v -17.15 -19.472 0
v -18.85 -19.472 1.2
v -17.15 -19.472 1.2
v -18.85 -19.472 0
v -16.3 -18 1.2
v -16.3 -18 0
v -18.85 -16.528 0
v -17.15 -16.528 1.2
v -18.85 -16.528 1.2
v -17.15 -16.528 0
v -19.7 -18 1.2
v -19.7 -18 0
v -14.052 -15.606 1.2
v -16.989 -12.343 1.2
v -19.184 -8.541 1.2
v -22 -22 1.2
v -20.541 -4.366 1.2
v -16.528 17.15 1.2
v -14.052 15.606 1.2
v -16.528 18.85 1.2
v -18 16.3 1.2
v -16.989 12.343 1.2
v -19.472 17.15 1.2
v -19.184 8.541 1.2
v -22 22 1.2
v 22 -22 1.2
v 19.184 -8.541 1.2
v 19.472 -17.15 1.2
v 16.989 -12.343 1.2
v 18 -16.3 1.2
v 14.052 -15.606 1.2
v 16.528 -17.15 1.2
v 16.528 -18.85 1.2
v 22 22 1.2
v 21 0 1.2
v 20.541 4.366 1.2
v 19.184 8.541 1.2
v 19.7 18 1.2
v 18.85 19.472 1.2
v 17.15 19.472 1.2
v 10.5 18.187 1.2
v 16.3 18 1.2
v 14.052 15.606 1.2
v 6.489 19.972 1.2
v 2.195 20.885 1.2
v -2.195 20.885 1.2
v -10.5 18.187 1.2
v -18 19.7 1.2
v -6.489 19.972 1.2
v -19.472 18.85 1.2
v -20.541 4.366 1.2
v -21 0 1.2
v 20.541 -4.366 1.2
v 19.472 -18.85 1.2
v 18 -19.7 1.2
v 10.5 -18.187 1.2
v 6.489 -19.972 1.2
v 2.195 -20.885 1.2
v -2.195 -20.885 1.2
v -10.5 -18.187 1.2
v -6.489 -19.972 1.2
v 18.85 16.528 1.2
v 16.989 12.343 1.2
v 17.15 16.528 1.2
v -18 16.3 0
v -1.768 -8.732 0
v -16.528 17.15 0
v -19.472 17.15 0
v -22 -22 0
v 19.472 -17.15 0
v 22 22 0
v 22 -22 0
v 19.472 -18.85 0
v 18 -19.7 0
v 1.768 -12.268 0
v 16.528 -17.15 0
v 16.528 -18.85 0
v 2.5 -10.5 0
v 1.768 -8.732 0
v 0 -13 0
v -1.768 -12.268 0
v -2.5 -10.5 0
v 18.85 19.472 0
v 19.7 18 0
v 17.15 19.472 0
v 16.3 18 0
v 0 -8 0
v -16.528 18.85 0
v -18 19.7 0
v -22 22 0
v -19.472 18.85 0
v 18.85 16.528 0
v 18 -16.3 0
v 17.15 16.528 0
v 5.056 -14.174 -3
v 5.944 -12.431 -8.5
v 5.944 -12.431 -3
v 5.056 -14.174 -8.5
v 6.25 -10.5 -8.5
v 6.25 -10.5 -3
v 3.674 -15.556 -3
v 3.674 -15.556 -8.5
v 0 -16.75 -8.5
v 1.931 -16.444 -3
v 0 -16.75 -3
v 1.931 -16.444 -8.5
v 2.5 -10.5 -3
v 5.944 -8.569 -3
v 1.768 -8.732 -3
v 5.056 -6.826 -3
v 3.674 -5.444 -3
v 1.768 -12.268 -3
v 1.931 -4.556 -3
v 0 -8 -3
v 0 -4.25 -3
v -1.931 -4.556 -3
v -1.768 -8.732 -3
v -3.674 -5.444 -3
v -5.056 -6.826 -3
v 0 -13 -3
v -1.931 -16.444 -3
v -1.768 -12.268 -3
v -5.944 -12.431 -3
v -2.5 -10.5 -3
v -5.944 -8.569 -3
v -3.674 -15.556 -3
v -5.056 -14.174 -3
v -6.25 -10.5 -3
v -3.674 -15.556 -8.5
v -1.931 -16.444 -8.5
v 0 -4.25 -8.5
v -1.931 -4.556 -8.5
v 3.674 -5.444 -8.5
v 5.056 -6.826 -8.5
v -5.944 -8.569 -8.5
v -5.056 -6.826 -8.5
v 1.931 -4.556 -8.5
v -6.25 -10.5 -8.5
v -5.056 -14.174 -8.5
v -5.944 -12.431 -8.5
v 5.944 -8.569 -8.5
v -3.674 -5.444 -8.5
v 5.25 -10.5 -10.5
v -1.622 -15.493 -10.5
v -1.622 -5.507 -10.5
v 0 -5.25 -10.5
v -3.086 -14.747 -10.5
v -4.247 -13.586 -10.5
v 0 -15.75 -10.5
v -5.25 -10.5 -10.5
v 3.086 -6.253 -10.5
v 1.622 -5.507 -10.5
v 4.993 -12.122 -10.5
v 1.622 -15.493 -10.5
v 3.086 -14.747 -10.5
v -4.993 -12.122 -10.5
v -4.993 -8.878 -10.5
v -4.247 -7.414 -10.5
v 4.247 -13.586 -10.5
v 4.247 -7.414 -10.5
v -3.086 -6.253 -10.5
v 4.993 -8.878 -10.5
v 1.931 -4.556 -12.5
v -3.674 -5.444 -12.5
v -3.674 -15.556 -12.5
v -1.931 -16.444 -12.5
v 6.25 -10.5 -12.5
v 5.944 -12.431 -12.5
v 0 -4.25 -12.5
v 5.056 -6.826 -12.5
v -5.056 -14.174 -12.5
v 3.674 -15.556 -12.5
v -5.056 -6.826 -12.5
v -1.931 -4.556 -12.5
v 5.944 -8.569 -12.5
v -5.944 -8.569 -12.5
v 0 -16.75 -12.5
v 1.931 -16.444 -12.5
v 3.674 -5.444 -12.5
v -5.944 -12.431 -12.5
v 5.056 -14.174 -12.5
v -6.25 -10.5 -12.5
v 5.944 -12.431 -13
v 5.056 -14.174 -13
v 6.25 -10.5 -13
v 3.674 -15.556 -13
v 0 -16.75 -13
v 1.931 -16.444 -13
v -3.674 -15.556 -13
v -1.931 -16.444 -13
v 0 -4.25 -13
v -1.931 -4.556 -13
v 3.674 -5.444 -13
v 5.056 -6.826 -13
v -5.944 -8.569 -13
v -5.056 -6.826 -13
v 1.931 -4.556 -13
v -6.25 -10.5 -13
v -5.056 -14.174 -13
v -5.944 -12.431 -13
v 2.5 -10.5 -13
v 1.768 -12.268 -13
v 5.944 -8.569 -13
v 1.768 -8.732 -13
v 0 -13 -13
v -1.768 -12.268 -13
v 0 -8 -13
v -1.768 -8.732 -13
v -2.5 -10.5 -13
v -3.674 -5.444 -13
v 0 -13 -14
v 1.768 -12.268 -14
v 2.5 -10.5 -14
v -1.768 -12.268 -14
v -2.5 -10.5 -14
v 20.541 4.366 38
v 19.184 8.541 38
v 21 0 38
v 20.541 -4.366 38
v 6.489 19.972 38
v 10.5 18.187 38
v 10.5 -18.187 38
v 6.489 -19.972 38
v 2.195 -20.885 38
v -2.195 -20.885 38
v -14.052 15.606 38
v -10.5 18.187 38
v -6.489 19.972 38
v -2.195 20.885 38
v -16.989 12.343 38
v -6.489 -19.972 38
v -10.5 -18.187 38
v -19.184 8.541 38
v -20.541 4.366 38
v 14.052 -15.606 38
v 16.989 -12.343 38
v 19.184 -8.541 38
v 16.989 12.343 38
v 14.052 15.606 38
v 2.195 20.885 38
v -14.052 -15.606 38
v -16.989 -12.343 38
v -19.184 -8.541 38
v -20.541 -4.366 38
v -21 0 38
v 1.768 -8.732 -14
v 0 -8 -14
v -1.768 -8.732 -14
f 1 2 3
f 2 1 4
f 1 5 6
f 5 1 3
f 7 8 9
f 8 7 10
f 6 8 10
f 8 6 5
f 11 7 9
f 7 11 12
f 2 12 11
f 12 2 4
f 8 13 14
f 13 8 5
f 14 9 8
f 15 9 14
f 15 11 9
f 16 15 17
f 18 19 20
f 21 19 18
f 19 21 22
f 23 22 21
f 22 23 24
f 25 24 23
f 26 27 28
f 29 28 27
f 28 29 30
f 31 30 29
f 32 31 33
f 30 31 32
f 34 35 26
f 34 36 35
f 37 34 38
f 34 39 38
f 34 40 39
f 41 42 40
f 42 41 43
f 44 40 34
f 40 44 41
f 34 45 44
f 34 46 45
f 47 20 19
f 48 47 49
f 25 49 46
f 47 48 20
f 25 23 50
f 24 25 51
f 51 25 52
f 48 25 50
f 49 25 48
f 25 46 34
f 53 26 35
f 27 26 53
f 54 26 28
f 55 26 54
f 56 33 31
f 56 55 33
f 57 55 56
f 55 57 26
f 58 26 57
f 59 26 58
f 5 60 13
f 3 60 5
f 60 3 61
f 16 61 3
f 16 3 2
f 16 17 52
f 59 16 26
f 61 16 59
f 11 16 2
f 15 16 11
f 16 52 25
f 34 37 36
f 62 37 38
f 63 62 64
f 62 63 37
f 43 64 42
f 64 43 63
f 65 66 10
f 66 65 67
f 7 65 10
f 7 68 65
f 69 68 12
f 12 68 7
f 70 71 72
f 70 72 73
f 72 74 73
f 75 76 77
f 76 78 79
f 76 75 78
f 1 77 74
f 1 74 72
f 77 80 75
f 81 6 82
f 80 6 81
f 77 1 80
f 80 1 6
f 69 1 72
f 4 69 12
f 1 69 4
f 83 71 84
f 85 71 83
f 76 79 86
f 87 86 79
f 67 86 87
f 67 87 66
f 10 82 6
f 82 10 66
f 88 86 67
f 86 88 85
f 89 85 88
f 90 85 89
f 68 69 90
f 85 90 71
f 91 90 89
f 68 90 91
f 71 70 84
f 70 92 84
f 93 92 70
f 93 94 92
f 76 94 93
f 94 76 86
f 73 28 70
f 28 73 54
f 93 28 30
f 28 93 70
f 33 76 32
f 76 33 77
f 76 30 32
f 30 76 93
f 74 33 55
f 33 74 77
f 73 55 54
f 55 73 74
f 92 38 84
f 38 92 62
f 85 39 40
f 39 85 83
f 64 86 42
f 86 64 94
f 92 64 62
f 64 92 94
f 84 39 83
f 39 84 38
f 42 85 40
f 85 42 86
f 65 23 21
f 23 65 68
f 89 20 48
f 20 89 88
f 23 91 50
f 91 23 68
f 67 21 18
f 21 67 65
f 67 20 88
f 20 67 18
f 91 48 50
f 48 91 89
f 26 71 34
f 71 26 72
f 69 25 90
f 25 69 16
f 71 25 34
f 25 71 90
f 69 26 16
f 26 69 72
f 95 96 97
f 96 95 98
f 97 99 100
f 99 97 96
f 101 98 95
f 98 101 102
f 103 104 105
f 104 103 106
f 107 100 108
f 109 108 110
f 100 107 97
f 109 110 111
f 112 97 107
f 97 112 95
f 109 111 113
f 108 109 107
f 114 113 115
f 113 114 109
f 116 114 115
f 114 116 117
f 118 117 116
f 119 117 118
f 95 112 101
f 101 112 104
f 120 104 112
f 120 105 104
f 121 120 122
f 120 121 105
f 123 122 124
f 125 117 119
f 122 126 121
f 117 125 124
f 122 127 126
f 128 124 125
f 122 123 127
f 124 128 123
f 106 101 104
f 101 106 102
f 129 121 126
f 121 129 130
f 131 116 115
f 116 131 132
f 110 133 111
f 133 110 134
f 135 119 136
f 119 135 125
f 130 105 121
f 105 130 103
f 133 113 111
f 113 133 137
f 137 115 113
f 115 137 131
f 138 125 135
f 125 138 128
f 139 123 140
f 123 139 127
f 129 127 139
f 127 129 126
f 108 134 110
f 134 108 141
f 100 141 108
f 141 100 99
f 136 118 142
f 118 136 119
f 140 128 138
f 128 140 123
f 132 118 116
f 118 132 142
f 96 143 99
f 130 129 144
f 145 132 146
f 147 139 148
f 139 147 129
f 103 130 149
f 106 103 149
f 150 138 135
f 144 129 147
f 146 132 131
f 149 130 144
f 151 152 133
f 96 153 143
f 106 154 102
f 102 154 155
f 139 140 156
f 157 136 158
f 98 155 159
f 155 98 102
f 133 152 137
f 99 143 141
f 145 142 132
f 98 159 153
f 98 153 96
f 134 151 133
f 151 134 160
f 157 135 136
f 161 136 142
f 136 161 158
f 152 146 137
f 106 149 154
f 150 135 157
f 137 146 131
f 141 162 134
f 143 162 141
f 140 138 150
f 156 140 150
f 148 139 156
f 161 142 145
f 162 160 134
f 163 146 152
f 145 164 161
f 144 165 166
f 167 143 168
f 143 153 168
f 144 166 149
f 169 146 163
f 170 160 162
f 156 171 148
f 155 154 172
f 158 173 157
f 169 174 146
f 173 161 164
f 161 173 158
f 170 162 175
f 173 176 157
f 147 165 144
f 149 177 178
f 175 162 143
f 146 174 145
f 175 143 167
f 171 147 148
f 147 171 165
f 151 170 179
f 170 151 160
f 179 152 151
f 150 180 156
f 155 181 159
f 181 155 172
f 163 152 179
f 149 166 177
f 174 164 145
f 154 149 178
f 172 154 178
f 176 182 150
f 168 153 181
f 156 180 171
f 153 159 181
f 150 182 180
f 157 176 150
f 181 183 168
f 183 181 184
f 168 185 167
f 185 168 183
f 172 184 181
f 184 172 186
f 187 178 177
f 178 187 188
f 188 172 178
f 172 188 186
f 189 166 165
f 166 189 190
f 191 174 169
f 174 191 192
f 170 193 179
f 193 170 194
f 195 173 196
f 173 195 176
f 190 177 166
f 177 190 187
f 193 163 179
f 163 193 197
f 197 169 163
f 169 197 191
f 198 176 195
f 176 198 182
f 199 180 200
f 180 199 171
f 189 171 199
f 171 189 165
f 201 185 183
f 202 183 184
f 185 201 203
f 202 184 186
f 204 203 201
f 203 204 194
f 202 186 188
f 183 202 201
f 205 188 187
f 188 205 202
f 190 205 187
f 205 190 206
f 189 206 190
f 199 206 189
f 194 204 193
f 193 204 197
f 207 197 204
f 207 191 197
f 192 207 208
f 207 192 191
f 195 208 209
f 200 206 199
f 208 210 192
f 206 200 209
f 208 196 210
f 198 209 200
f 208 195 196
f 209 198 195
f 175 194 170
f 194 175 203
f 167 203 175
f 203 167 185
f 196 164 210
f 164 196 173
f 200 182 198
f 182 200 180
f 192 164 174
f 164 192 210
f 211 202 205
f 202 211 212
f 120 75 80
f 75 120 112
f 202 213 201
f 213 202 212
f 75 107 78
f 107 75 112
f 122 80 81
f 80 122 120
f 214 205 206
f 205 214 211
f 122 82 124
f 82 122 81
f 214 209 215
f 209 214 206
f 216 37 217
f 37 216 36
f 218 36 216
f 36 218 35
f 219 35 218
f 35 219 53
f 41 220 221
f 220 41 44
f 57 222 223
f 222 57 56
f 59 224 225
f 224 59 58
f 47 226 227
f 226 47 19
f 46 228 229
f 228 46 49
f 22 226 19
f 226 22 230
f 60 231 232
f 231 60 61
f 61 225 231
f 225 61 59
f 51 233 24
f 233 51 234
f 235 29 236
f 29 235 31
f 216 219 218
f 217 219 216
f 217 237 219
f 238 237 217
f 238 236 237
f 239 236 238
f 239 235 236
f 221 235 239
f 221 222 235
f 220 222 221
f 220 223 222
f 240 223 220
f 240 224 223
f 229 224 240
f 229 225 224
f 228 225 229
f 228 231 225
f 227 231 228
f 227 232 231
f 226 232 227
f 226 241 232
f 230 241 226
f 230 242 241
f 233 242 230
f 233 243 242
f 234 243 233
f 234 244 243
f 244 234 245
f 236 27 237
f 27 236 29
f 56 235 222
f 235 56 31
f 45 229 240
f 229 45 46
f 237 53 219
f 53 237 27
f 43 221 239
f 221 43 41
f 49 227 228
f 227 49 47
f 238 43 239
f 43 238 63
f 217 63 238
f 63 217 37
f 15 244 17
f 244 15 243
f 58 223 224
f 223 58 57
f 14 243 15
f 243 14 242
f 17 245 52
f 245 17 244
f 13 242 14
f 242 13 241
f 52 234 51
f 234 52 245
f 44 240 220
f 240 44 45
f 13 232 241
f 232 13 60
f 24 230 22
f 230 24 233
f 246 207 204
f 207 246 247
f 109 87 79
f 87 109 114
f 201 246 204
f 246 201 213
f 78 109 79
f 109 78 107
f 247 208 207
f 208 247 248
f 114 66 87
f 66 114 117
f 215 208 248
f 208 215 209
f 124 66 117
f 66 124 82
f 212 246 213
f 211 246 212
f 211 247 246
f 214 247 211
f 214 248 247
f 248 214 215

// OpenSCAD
// Author: EiNSTeiN_ <einstein@g3nius.org>

module motor_42BYG48HJ50(mini_hyena=false) {

	cylinder(h=38,r=42/2);

	difference() {
		translate([-22,-22,0]) cube([44,44,1.2]);
		for(r=[0,90,180,270])
			rotate([0,0,r]) translate([-36/2,-36/2, 0]) cylinder(h=1.2,r=3.4/2);
	}

	translate([0,(-44/2)+11.5,-14]) cylinder(r=5/2,h=14);


	// mini hyena: H=10mm, ID=5mm, OD=12.5mm
	if(mini_hyena) translate([0,(-44/2)+11.5,-3]) rotate([180,0,0]) difference() {
		union() {
			cylinder(h=5.5,r=12.5/2);
			translate([0,0,5.5]) cylinder(h=2,r2=10.5/2, r1=12.5/2);
			translate([0,0,5.5+2]) cylinder(h=2, r2=12.5/2,r1=10.5/2);
			translate([0,0,9.5]) cylinder(h=0.5,r=12.5/2);
		}
		cylinder(h=10,r=5/2);
	}
}

motor_42BYG48HJ50(mini_hyena=true);
